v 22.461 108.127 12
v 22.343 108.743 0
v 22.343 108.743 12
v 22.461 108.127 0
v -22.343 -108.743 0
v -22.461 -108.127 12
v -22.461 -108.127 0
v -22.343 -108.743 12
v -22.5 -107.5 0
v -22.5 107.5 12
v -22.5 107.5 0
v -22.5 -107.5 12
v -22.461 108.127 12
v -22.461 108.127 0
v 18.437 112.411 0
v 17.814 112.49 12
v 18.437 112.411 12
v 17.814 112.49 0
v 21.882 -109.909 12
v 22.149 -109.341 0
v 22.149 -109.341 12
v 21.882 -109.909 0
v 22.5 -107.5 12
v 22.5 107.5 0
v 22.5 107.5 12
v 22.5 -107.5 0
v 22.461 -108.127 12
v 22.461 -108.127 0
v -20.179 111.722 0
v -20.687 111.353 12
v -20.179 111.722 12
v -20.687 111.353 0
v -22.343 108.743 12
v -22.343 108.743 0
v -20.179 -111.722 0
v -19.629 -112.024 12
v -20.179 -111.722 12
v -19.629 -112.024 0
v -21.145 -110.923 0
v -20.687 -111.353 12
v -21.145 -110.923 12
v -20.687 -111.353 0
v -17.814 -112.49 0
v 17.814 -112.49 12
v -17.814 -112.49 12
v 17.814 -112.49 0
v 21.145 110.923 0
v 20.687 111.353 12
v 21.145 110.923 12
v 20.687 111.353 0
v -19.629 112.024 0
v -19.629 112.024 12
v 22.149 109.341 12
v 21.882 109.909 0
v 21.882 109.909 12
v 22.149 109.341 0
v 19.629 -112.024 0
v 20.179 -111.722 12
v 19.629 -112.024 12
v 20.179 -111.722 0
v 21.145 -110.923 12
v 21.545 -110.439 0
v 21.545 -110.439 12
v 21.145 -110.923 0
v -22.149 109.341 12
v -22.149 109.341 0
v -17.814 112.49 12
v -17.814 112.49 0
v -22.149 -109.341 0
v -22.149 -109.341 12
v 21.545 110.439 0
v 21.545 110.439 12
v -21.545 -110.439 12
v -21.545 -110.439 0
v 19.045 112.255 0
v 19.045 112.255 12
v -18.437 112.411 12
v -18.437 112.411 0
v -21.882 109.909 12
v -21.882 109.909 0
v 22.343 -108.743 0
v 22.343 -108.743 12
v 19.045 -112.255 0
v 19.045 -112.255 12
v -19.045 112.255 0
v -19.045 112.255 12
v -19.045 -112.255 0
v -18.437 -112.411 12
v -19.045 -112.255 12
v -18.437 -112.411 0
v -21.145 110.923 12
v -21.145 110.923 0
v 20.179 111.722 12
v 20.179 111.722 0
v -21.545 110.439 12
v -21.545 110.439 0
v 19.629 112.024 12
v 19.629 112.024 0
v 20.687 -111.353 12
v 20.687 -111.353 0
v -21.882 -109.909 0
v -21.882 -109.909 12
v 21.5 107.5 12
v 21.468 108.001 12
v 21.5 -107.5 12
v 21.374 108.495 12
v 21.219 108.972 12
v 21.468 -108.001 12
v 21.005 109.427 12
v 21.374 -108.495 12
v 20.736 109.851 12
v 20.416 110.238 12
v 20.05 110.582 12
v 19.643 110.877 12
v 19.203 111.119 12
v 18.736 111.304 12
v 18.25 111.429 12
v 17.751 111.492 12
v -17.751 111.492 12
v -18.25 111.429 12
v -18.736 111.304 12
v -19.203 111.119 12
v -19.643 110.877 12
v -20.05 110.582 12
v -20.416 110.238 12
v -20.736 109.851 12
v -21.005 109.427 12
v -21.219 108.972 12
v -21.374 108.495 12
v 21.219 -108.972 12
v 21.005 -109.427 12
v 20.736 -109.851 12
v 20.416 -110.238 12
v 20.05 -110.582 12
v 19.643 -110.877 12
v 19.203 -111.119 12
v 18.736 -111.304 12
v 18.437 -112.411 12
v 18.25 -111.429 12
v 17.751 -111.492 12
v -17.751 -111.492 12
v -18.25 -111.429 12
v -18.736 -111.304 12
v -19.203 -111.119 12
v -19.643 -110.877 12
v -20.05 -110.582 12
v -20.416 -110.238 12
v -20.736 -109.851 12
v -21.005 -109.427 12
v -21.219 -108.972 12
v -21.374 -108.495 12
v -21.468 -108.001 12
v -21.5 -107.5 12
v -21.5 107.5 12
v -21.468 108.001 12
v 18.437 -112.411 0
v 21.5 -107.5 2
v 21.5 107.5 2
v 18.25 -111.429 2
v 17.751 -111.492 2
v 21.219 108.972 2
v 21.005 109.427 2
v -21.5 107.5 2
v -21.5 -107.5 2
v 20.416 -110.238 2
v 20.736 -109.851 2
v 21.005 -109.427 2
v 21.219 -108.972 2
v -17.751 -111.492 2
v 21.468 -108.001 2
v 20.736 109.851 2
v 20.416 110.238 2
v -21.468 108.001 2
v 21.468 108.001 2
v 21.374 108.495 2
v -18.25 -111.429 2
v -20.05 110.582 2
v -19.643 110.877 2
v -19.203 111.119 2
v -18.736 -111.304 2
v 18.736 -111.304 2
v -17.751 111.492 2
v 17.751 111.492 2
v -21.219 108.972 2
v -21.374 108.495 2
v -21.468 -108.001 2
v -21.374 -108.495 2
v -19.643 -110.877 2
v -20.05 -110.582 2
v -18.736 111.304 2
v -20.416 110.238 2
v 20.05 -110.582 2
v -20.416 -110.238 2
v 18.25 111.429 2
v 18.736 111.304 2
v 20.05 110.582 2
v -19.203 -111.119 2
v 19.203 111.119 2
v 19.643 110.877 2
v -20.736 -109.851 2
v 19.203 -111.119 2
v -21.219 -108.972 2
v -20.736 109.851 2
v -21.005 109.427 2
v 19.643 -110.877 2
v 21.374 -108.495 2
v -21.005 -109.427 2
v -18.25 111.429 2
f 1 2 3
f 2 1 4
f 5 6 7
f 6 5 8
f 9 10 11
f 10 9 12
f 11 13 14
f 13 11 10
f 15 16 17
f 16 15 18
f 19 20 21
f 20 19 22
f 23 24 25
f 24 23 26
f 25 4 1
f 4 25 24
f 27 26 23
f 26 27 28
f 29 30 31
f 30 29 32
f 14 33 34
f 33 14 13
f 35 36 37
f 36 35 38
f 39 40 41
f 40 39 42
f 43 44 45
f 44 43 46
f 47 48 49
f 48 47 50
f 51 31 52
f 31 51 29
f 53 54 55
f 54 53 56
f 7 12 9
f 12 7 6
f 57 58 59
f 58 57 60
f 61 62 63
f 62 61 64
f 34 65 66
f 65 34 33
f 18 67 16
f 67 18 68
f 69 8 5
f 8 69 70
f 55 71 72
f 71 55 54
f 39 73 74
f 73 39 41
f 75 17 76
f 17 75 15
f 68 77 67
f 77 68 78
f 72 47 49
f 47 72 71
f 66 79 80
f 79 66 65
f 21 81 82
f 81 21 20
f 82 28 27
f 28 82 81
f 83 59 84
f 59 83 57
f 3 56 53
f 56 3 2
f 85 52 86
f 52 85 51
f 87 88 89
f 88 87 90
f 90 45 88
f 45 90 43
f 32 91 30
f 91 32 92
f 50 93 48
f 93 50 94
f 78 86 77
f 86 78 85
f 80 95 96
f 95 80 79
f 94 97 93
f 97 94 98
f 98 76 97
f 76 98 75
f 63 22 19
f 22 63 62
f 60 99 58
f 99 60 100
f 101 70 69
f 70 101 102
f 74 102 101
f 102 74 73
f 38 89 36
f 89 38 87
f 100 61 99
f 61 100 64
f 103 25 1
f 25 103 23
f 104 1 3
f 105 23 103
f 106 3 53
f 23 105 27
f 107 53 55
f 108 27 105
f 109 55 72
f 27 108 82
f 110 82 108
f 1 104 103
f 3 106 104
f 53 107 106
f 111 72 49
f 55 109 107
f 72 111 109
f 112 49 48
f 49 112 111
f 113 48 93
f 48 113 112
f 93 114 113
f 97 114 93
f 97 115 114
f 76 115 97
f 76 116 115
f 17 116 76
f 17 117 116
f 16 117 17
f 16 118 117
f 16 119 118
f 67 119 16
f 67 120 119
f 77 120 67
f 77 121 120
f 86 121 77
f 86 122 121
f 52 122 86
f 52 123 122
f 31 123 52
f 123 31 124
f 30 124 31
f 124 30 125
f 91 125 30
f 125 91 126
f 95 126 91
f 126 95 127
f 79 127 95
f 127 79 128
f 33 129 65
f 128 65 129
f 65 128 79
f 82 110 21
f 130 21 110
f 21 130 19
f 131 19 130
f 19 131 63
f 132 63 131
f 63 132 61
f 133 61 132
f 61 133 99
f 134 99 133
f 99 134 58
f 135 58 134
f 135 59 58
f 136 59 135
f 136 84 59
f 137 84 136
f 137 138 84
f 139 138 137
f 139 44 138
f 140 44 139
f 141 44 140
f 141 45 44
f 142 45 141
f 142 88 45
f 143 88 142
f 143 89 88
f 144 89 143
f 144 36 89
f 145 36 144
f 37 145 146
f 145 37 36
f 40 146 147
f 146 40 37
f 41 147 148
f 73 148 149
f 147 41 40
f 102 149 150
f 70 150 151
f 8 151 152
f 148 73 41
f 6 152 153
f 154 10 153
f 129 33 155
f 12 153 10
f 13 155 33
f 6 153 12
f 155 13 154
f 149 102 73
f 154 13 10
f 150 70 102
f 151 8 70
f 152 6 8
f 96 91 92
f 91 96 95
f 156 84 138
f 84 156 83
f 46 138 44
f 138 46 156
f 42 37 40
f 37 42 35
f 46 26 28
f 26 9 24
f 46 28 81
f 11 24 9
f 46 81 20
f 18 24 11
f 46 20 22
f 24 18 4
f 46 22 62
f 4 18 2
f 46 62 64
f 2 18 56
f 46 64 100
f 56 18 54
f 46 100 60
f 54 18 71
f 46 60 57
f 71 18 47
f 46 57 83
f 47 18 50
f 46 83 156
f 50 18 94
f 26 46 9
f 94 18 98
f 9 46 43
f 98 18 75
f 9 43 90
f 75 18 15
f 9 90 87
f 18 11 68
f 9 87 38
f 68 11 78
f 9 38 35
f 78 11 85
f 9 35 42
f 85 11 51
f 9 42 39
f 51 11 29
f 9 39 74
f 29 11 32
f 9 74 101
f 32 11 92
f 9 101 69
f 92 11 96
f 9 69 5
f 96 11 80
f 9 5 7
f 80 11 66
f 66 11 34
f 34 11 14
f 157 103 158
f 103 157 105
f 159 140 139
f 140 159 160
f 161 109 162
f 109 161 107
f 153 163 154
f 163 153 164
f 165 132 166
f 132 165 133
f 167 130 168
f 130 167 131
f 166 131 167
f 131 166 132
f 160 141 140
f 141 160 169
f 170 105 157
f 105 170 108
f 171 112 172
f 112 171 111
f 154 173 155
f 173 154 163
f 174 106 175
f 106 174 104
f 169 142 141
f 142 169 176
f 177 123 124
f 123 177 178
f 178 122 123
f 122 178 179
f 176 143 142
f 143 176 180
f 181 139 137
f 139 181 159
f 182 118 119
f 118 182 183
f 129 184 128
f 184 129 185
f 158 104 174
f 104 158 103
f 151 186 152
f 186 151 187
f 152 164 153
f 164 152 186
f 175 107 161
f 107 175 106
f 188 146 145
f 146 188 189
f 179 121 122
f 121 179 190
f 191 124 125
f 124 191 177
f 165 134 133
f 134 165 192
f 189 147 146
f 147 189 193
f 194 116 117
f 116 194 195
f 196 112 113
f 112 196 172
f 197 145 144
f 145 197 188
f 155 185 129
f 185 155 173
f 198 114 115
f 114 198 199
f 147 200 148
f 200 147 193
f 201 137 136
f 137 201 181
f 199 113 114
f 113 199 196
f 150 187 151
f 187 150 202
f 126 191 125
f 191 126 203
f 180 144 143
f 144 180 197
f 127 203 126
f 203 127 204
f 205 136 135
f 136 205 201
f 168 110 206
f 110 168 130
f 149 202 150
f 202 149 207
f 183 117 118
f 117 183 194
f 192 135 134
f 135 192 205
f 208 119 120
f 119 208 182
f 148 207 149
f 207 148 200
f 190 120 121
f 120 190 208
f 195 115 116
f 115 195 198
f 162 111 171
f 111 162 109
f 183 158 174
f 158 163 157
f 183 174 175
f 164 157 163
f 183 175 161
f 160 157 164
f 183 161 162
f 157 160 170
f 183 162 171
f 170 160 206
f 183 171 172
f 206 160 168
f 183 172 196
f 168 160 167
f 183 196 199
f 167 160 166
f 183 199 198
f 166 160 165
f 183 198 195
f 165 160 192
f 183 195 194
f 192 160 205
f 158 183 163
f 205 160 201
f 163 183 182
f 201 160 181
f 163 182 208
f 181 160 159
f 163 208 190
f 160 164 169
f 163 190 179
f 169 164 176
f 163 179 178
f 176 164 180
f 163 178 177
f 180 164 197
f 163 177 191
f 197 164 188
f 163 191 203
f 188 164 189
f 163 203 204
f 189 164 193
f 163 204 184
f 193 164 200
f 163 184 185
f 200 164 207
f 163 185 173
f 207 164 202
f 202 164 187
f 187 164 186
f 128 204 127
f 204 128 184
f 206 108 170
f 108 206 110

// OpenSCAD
$fn = 50;


difference() {
	union() {
		hull() {
			translate(v = [-17.5000000000, 107.5000000000, 0]) {
				cylinder(h = 12, r = 5);
			}
			translate(v = [17.5000000000, 107.5000000000, 0]) {
				cylinder(h = 12, r = 5);
			}
			translate(v = [-17.5000000000, -107.5000000000, 0]) {
				cylinder(h = 12, r = 5);
			}
			translate(v = [17.5000000000, -107.5000000000, 0]) {
				cylinder(h = 12, r = 5);
			}
		}
	}
	union() {
		translate(v = [0, 0, 2]) {
			hull() {
				translate(v = [-17.5000000000, 107.5000000000, 0]) {
					cylinder(h = 10, r = 4);
				}
				translate(v = [17.5000000000, 107.5000000000, 0]) {
					cylinder(h = 10, r = 4);
				}
				translate(v = [-17.5000000000, -107.5000000000, 0]) {
					cylinder(h = 10, r = 4);
				}
				translate(v = [17.5000000000, -107.5000000000, 0]) {
					cylinder(h = 10, r = 4);
				}
			}
		}
	}
}
